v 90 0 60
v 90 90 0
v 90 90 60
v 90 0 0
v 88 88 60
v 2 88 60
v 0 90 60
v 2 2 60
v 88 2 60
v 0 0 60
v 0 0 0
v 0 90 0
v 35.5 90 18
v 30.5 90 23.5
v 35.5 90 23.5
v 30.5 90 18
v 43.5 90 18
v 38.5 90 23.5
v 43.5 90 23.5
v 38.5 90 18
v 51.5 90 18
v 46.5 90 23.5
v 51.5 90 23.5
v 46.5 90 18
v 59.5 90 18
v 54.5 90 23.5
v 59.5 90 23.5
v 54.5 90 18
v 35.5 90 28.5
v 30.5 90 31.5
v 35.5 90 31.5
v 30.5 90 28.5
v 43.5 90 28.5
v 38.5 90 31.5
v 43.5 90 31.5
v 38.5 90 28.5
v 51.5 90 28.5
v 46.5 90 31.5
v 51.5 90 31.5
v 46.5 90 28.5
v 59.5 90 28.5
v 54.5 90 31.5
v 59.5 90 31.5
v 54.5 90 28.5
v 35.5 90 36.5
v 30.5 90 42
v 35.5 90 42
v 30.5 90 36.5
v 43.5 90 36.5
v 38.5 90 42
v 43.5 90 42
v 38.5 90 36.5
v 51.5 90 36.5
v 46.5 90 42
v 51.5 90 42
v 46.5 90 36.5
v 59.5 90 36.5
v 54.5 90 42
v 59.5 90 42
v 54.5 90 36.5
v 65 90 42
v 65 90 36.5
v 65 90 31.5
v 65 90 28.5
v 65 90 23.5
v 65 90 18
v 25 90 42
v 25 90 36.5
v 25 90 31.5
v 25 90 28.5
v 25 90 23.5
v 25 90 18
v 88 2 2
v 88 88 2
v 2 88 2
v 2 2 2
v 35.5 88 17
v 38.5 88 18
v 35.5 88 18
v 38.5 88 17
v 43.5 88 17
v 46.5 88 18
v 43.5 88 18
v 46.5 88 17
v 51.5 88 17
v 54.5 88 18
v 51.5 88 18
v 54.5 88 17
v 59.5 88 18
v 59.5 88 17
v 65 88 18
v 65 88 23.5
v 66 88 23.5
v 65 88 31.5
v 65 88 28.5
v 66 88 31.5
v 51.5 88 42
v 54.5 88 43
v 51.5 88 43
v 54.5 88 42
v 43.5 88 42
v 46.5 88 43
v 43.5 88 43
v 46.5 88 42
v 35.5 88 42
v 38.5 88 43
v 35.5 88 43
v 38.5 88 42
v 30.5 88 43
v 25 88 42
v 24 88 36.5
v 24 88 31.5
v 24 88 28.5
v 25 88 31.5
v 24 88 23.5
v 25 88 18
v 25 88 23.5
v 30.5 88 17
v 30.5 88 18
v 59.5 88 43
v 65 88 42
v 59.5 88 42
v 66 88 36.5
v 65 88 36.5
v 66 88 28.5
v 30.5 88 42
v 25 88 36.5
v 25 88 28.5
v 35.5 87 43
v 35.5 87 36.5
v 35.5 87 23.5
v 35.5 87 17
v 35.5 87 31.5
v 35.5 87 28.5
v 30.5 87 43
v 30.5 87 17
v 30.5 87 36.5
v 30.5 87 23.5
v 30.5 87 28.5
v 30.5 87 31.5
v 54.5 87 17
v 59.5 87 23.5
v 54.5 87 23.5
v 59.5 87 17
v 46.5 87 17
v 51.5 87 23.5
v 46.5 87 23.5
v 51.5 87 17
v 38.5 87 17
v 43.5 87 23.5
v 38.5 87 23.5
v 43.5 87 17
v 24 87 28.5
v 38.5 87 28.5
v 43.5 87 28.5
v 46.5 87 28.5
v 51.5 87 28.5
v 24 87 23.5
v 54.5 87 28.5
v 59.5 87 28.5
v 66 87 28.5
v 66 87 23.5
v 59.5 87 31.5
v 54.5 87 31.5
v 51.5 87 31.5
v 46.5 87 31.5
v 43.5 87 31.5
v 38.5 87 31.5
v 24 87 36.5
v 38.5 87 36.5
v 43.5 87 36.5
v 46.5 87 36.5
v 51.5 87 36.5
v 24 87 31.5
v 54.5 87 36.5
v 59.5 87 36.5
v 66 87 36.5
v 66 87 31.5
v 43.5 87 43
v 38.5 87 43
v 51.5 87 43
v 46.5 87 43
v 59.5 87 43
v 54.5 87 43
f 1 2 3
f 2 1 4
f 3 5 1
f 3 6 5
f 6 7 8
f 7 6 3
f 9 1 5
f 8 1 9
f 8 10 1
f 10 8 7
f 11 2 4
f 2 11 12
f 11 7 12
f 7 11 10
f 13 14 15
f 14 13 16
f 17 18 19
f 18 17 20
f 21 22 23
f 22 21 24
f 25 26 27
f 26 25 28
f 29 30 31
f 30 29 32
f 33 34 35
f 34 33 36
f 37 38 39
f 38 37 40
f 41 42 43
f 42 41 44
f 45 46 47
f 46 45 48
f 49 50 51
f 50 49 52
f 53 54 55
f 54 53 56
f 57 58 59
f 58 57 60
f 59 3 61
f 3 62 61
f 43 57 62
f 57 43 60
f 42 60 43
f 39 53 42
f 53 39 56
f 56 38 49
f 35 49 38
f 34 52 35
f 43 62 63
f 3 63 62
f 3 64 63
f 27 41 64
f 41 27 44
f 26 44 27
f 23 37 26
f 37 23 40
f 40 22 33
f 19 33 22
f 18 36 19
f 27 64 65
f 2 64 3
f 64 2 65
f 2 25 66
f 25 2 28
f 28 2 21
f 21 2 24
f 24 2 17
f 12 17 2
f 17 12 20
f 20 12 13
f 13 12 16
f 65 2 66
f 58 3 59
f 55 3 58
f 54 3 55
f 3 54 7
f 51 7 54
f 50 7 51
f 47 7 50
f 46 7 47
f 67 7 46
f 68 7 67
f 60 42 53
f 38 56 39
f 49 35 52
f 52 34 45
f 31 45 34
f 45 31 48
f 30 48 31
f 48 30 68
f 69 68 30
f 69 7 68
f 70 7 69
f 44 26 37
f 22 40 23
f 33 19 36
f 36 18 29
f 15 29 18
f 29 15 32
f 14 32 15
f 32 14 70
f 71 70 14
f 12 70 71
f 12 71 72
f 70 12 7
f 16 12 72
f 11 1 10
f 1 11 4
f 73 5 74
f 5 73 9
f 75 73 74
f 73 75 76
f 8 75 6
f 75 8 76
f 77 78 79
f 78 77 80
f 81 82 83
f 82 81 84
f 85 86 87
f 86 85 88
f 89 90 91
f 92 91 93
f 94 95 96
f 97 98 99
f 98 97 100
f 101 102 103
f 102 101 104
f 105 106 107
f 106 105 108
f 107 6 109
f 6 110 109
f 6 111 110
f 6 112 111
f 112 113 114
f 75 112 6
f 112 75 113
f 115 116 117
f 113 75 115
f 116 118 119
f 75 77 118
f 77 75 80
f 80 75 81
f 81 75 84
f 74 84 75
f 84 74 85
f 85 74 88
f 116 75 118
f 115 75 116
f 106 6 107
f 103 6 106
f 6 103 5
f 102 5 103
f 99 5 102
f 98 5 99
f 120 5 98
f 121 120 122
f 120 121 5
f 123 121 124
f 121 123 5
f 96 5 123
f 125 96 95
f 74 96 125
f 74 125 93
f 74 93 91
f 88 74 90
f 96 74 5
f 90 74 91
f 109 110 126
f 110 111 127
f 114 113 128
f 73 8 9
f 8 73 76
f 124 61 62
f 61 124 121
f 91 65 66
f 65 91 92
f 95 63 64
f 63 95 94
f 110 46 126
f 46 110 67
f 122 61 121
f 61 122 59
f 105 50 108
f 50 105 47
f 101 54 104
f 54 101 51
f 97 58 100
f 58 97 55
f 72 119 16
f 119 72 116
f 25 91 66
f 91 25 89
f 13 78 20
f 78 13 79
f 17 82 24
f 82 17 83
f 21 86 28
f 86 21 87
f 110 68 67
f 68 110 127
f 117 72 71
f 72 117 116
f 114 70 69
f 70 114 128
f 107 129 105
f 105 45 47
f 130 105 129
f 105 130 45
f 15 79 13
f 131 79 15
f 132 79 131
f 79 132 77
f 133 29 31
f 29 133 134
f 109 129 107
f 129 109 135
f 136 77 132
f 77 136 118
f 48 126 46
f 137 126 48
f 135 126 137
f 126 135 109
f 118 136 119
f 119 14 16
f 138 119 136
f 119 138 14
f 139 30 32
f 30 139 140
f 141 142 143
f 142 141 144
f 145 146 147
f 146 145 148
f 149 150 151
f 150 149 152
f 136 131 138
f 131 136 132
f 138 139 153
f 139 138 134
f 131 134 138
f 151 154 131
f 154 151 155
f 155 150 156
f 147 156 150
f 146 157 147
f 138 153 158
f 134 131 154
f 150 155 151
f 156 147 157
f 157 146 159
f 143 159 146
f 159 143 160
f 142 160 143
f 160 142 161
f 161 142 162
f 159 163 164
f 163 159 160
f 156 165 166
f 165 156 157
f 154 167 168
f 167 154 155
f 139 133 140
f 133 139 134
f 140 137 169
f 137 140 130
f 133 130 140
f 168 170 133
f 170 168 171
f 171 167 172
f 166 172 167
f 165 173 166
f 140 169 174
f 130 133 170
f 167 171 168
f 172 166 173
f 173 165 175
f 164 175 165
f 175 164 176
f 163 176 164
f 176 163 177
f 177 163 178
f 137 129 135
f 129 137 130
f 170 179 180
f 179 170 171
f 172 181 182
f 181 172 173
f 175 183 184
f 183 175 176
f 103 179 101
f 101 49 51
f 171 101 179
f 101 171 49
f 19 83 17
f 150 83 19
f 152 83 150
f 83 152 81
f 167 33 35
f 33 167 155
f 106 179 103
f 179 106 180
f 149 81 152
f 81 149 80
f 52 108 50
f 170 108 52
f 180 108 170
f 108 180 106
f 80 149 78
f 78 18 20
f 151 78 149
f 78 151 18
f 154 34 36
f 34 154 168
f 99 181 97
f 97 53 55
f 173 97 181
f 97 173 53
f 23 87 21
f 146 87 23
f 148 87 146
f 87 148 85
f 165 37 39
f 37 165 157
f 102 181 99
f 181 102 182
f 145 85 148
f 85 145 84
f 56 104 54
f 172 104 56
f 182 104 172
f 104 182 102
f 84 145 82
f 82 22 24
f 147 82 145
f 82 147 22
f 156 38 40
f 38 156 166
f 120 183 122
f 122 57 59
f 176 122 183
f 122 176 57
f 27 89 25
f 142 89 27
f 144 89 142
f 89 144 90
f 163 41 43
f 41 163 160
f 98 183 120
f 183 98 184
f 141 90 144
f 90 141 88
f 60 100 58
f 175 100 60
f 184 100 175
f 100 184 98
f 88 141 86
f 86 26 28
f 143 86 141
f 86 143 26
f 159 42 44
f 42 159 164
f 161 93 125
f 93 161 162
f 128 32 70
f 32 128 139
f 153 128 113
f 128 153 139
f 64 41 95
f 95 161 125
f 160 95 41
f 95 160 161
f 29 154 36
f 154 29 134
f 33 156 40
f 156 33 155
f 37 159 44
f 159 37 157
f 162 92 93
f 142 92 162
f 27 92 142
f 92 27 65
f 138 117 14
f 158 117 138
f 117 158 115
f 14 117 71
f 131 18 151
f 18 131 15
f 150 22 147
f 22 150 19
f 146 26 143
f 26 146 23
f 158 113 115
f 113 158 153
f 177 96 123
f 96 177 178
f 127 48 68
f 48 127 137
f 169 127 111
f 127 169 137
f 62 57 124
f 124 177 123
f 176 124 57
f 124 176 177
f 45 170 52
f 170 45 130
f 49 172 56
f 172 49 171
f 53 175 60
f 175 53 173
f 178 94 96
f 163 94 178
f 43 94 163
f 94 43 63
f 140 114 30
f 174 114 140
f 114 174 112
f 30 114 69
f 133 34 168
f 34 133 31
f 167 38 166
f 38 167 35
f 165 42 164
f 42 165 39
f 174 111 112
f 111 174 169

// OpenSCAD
$fn = 32;

// ----------------------------------------------------------------------
// Vent box: crossgrid enclosure
// ----------------------------------------------------------------------

// --- parameters (mm) ---
box_l = 90;               // box length, X
box_w = 90;               // box width, Y
box_h = 60;               // box height, Z
wall_t = 2;               // shell wall thickness
win_l = 40;               // vent window width, X
win_h = 24;               // vent window height, Z
bar_w = 5;                // grid bar width
n_v = 4;                  // vertical bar count
n_h = 2;                  // horizontal bar count

win_z0 = (box_h - win_h) / 2;  // window lower edge Z
v_step = win_l / (n_v + 1);  // vertical bar step
h_step = win_h / (n_h + 1);  // horizontal bar step

difference() {
  union() {
    difference() {
      cube([box_l, box_w, box_h]);
  translate([wall_t, wall_t, wall_t])
    cube([box_l - 2 * wall_t, box_w - 2 * wall_t, box_h]);
  translate([(box_l - win_l) / 2, box_w - wall_t - 1, win_z0])
    cube([win_l, wall_t + 2, win_h]);
    }
    for (i = [1 : n_v])
      translate([(box_l - win_l) / 2 + i * v_step - bar_w / 2,
                 box_w - wall_t - 1, win_z0 - 1])
        cube([bar_w, wall_t + 1, win_h + 2]);
    for (i = [1 : n_h])
      translate([(box_l - win_l) / 2 - 1, box_w - wall_t - 1,
                 win_z0 + i * h_step - bar_w / 2])
        cube([win_l + 2, wall_t + 1, bar_w]);
  }
}
